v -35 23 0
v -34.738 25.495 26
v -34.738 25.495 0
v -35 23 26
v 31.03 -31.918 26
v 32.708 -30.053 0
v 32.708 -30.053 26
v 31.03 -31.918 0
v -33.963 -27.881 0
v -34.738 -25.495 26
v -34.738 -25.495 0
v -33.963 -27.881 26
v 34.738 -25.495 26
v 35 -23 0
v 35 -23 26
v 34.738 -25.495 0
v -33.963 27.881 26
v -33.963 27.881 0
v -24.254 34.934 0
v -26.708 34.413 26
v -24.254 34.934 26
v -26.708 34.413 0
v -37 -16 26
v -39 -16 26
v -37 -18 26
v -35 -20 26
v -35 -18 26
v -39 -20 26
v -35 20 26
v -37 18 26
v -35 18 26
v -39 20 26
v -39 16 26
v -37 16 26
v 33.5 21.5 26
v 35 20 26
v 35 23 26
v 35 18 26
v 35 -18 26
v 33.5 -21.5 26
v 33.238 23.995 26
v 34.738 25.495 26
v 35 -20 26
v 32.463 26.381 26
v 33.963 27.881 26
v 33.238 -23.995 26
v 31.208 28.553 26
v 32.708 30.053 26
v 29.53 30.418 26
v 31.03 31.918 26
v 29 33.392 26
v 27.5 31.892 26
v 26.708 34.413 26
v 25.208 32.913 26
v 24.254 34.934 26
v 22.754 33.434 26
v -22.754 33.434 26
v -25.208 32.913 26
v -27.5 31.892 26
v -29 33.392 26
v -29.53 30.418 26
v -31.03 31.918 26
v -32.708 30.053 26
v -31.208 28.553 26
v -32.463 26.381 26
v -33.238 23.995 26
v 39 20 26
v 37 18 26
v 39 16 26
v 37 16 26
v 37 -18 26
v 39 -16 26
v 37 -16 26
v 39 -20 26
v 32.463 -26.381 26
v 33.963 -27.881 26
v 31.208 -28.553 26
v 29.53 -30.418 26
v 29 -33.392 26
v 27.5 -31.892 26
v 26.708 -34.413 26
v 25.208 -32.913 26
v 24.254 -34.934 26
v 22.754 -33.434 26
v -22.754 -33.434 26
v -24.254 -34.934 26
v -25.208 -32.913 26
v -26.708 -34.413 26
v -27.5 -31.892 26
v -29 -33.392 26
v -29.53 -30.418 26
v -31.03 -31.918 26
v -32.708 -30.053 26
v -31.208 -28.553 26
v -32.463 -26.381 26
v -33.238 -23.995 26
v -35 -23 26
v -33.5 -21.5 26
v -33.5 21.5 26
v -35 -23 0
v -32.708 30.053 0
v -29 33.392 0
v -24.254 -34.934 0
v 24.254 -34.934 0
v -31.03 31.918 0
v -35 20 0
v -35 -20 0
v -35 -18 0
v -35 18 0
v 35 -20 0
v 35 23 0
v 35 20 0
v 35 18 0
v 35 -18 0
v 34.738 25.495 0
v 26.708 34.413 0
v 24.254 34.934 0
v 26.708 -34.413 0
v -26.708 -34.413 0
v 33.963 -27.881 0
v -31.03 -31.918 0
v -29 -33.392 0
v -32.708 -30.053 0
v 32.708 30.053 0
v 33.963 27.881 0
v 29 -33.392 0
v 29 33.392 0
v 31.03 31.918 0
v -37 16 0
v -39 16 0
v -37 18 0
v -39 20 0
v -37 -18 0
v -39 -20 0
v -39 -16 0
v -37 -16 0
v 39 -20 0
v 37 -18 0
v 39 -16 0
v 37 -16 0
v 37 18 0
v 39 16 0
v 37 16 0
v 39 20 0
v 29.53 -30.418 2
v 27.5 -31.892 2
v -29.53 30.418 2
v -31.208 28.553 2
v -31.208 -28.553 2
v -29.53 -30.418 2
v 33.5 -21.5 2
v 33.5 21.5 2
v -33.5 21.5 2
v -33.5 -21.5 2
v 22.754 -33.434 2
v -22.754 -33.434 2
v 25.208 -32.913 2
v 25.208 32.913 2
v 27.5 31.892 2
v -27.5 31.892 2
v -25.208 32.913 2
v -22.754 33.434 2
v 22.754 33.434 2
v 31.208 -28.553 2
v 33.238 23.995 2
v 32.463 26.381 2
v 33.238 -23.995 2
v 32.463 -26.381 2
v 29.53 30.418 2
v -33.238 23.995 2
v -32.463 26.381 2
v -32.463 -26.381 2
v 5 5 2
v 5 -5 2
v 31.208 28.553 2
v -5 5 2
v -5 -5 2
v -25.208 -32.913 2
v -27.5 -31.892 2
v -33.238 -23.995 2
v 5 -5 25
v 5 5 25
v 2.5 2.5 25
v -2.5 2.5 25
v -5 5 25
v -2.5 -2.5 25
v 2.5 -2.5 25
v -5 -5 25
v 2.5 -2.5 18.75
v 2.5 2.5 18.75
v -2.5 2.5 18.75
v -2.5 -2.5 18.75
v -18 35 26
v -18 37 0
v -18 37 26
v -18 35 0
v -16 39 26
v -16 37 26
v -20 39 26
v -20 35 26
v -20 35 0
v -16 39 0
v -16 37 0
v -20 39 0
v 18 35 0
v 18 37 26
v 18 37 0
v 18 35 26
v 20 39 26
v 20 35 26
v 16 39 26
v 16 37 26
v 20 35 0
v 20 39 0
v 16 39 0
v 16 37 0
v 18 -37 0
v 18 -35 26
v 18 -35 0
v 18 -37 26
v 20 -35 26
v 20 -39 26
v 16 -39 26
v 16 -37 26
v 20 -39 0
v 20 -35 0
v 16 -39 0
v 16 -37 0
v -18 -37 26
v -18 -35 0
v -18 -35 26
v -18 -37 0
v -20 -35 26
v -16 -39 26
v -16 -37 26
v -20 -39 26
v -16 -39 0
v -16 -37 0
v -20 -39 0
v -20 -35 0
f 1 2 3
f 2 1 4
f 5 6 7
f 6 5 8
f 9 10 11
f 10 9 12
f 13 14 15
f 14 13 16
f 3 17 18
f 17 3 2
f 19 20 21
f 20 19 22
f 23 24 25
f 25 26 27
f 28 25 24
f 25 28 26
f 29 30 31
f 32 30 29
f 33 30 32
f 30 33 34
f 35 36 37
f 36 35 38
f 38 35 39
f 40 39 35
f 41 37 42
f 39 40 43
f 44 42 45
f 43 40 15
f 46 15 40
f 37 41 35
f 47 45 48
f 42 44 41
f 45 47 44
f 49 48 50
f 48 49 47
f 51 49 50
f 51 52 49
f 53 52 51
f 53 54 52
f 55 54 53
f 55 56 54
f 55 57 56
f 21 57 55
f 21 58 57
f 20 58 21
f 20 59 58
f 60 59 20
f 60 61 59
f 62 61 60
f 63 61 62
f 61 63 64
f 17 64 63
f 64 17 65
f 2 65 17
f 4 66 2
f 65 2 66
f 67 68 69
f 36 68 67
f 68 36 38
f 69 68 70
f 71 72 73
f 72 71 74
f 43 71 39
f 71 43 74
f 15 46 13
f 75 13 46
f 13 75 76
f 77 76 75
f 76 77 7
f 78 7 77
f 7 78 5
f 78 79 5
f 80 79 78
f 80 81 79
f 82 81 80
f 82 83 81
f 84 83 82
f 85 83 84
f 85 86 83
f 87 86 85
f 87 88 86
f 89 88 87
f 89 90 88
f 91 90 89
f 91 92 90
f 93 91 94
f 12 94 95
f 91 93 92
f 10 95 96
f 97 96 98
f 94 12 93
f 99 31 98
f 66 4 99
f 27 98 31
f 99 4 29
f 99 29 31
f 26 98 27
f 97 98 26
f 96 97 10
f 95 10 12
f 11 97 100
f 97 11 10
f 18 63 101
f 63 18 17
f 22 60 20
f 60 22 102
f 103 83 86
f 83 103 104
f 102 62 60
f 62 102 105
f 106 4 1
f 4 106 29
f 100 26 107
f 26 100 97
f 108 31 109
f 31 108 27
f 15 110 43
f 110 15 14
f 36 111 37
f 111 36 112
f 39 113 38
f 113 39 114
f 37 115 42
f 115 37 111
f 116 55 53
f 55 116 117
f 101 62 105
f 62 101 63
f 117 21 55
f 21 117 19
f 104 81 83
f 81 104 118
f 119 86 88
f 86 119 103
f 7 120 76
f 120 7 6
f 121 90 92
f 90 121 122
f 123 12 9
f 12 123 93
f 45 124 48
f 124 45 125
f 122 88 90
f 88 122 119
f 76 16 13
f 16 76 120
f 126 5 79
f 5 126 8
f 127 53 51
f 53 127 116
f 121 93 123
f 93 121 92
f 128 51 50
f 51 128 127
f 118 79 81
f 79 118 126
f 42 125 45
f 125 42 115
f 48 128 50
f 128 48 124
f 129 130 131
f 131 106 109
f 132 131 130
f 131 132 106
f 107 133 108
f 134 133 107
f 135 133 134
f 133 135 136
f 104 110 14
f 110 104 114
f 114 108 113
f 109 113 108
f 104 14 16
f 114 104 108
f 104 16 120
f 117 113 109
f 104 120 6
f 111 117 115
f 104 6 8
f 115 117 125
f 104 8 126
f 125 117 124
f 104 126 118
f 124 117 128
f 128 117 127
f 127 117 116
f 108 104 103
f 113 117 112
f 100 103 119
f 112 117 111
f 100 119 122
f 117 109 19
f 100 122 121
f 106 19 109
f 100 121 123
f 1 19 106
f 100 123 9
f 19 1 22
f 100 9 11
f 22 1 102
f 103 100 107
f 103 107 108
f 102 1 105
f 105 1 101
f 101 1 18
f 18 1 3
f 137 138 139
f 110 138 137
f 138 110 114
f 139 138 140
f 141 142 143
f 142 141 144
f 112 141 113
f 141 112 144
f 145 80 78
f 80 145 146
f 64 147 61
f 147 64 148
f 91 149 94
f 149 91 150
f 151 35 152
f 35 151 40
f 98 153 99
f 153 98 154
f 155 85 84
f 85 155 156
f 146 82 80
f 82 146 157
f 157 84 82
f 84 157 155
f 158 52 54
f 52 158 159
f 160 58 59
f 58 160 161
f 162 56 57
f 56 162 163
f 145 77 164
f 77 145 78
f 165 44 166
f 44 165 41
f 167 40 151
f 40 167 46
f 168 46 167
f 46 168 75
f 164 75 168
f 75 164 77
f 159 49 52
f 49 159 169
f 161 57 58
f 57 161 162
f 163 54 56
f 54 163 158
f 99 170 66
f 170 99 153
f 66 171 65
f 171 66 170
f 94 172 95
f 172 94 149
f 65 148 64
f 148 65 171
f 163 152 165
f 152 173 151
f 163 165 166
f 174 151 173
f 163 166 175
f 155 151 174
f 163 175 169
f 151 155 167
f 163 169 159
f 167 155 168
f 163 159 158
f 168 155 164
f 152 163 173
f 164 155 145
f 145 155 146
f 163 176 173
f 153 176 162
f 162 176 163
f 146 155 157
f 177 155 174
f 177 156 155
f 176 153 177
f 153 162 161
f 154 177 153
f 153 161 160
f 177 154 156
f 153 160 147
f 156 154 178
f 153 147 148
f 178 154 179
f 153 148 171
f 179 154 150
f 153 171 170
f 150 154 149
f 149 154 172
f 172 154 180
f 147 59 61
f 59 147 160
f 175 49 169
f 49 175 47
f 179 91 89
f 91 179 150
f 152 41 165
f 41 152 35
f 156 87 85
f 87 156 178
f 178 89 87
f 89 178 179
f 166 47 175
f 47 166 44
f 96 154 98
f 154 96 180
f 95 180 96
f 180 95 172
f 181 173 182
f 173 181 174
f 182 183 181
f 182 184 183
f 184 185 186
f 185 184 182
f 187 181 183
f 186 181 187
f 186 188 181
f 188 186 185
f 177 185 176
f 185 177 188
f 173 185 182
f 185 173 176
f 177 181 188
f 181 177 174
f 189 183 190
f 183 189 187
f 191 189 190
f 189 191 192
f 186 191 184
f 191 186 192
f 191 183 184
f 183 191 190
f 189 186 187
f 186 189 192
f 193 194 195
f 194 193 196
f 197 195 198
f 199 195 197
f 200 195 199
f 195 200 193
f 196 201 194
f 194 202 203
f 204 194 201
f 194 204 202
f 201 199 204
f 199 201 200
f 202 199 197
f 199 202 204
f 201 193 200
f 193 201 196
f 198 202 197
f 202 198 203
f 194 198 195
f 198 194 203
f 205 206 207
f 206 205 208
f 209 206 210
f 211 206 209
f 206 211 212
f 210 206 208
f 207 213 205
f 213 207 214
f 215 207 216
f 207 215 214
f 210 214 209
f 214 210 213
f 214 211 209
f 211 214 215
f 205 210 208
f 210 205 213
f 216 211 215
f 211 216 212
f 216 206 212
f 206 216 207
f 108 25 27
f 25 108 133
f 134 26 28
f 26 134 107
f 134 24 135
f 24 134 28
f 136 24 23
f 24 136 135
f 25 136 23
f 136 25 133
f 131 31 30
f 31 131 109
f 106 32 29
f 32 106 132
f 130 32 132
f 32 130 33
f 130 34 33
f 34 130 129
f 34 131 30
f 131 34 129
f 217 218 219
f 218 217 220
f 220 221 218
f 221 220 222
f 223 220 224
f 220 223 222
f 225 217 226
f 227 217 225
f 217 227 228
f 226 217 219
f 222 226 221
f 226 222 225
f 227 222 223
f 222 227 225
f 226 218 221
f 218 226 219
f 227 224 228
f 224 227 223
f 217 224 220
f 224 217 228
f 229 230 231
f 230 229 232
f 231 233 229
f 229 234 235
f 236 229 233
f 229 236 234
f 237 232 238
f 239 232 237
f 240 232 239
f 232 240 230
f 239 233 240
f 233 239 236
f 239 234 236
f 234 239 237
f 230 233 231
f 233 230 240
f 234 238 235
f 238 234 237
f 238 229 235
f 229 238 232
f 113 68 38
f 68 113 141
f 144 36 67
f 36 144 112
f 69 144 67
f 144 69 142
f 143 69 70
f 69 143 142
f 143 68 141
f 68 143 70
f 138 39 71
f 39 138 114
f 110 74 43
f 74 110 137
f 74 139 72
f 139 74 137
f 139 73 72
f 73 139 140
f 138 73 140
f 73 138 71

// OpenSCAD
// Parametric capsule holder with module (base, middle, high)

baseHeight = 25; // height of the base

edgeSize = 70; // size of the capsule holder
edgeRadius = 12; // radius of the minkowski
edgeDepth = 3; // Width of the wall

railSpace = 40; // Space between the two rails
railWidth = 2; // Width of the wall
railInner = 2; // inner space between the outer wall and the inner wall (holding the capsule)
railLength = 2; // length of the holding part

// Use 1 for base, 2 for middle module, 3 for upper module
draw = 3;

// Defines the outer edge
module outerEdge(edgeHeight) { 
    minkowski() {
        cube([
        edgeSize - (2 * edgeRadius), 
        edgeSize - (2 * edgeRadius),
        edgeHeight], 
        center = true);
        
        cylinder(r=edgeRadius,h=1);
    };
}

// Defines the inner edge
module innerEdge(edgeHeight) {
    minkowski() {
        cube([
        edgeSize - (2 * edgeRadius) - edgeDepth, 
        edgeSize - (2 * edgeRadius) - edgeDepth,
        baseHeight], 
        center = true);
        
        cylinder(r=edgeRadius,h=1);
    }
}

// defines the L part of the rail, add a bottom bar for the base
module rail(baseRail) {
       translate([-1 * railSpace / 2, 0, 0])  
        union() {
            cube([railWidth, railInner + railWidth, baseHeight + 1]);
            translate([railWidth, railInner, 0]) cube([railLength, railWidth, baseHeight + 1]);
        }
        if(baseRail == true) {
            translate([-1 * railSpace / 2]) cube([railSpace / 2, railInner, 2]);
        }
}

// defines the two part of the rail
module oneRail(baseRail) {
    translate([0, edgeSize/2, 0])  rail(baseRail);
    mirror([1, 0, 0]) translate([0, edgeSize/2, 0])  rail(baseRail);    
}

// defines the 4 rail (one on each face
module addRail(baseRail) {
    oneRail(baseRail);
    rotate([0, 0, 90]) oneRail(baseRail);
    rotate([0, 0, 180]) oneRail(baseRail);
    rotate([0, 0, 270]) oneRail(baseRail);
}

// defines pilar to maintain central shaft
module pilar() {
    translate([5, -3, 0]) cube([edgeSize / 2 - 5, 6, 6]);
    rotate([0, 0, 90]) translate([5, -3, 0]) cube([edgeSize / 2 - 5, 6, 6]);
    rotate([0, 0, 180]) translate([5, -3, 0]) cube([edgeSize / 2 - 5, 6, 6]);
    rotate([0, 0, 270]) translate([5, -3, 0]) cube([edgeSize / 2 - 5, 6, 6]);    
}

// Defines the base
if(draw == 1) {
    union() {
        translate([0, 0, baseHeight / 2])
        difference() {
            outerEdge(baseHeight);
            translate([0, 0, 2]) innerEdge(baseHeight);
        }
        
        translate([0, 0, baseHeight / 2])
        difference() {
            cube([10, 10, baseHeight], center = true);
            translate([0, 0, baseHeight / 2]) cube([5, 5, baseHeight / 2], center = true);
        }
        
        addRail(baseRail = true);
    }
}

if(draw == 2)
{    
    union() {
        translate([0, 0, baseHeight / 2])
        difference() {
            outerEdge(baseHeight);
            innerEdge(baseHeight);            
        }
        
        pilar();
        
        translate([0, 0, baseHeight / 2])
        union() {
            difference() {
                cube([10, 10, baseHeight], center = true);
                translate([0, 0, -1 * baseHeight / 2]) cube([5, 5, baseHeight / 2], center = true);                
            }
            
            translate([0, 0, baseHeight / 2]) cube([5, 5, (baseHeight / 2) - 1], center = true);
        }
        
        addRail(baseRail = false);
    }
}

if(draw == 3)
{    
    union() {
        translate([0, 0, baseHeight / 2])
        difference() {
            outerEdge(baseHeight);
            translate([0, 0, 2]) innerEdge(baseHeight);            
        }
        
        translate([0, 0, baseHeight / 2])
        union() {
            difference() {
                cube([10, 10, baseHeight], center = true);
                translate([0, 0, baseHeight / 2]) cube([5, 5, baseHeight / 2], center = true);                
            }
        }
        
        addRail(baseRail = false);
    }
}
